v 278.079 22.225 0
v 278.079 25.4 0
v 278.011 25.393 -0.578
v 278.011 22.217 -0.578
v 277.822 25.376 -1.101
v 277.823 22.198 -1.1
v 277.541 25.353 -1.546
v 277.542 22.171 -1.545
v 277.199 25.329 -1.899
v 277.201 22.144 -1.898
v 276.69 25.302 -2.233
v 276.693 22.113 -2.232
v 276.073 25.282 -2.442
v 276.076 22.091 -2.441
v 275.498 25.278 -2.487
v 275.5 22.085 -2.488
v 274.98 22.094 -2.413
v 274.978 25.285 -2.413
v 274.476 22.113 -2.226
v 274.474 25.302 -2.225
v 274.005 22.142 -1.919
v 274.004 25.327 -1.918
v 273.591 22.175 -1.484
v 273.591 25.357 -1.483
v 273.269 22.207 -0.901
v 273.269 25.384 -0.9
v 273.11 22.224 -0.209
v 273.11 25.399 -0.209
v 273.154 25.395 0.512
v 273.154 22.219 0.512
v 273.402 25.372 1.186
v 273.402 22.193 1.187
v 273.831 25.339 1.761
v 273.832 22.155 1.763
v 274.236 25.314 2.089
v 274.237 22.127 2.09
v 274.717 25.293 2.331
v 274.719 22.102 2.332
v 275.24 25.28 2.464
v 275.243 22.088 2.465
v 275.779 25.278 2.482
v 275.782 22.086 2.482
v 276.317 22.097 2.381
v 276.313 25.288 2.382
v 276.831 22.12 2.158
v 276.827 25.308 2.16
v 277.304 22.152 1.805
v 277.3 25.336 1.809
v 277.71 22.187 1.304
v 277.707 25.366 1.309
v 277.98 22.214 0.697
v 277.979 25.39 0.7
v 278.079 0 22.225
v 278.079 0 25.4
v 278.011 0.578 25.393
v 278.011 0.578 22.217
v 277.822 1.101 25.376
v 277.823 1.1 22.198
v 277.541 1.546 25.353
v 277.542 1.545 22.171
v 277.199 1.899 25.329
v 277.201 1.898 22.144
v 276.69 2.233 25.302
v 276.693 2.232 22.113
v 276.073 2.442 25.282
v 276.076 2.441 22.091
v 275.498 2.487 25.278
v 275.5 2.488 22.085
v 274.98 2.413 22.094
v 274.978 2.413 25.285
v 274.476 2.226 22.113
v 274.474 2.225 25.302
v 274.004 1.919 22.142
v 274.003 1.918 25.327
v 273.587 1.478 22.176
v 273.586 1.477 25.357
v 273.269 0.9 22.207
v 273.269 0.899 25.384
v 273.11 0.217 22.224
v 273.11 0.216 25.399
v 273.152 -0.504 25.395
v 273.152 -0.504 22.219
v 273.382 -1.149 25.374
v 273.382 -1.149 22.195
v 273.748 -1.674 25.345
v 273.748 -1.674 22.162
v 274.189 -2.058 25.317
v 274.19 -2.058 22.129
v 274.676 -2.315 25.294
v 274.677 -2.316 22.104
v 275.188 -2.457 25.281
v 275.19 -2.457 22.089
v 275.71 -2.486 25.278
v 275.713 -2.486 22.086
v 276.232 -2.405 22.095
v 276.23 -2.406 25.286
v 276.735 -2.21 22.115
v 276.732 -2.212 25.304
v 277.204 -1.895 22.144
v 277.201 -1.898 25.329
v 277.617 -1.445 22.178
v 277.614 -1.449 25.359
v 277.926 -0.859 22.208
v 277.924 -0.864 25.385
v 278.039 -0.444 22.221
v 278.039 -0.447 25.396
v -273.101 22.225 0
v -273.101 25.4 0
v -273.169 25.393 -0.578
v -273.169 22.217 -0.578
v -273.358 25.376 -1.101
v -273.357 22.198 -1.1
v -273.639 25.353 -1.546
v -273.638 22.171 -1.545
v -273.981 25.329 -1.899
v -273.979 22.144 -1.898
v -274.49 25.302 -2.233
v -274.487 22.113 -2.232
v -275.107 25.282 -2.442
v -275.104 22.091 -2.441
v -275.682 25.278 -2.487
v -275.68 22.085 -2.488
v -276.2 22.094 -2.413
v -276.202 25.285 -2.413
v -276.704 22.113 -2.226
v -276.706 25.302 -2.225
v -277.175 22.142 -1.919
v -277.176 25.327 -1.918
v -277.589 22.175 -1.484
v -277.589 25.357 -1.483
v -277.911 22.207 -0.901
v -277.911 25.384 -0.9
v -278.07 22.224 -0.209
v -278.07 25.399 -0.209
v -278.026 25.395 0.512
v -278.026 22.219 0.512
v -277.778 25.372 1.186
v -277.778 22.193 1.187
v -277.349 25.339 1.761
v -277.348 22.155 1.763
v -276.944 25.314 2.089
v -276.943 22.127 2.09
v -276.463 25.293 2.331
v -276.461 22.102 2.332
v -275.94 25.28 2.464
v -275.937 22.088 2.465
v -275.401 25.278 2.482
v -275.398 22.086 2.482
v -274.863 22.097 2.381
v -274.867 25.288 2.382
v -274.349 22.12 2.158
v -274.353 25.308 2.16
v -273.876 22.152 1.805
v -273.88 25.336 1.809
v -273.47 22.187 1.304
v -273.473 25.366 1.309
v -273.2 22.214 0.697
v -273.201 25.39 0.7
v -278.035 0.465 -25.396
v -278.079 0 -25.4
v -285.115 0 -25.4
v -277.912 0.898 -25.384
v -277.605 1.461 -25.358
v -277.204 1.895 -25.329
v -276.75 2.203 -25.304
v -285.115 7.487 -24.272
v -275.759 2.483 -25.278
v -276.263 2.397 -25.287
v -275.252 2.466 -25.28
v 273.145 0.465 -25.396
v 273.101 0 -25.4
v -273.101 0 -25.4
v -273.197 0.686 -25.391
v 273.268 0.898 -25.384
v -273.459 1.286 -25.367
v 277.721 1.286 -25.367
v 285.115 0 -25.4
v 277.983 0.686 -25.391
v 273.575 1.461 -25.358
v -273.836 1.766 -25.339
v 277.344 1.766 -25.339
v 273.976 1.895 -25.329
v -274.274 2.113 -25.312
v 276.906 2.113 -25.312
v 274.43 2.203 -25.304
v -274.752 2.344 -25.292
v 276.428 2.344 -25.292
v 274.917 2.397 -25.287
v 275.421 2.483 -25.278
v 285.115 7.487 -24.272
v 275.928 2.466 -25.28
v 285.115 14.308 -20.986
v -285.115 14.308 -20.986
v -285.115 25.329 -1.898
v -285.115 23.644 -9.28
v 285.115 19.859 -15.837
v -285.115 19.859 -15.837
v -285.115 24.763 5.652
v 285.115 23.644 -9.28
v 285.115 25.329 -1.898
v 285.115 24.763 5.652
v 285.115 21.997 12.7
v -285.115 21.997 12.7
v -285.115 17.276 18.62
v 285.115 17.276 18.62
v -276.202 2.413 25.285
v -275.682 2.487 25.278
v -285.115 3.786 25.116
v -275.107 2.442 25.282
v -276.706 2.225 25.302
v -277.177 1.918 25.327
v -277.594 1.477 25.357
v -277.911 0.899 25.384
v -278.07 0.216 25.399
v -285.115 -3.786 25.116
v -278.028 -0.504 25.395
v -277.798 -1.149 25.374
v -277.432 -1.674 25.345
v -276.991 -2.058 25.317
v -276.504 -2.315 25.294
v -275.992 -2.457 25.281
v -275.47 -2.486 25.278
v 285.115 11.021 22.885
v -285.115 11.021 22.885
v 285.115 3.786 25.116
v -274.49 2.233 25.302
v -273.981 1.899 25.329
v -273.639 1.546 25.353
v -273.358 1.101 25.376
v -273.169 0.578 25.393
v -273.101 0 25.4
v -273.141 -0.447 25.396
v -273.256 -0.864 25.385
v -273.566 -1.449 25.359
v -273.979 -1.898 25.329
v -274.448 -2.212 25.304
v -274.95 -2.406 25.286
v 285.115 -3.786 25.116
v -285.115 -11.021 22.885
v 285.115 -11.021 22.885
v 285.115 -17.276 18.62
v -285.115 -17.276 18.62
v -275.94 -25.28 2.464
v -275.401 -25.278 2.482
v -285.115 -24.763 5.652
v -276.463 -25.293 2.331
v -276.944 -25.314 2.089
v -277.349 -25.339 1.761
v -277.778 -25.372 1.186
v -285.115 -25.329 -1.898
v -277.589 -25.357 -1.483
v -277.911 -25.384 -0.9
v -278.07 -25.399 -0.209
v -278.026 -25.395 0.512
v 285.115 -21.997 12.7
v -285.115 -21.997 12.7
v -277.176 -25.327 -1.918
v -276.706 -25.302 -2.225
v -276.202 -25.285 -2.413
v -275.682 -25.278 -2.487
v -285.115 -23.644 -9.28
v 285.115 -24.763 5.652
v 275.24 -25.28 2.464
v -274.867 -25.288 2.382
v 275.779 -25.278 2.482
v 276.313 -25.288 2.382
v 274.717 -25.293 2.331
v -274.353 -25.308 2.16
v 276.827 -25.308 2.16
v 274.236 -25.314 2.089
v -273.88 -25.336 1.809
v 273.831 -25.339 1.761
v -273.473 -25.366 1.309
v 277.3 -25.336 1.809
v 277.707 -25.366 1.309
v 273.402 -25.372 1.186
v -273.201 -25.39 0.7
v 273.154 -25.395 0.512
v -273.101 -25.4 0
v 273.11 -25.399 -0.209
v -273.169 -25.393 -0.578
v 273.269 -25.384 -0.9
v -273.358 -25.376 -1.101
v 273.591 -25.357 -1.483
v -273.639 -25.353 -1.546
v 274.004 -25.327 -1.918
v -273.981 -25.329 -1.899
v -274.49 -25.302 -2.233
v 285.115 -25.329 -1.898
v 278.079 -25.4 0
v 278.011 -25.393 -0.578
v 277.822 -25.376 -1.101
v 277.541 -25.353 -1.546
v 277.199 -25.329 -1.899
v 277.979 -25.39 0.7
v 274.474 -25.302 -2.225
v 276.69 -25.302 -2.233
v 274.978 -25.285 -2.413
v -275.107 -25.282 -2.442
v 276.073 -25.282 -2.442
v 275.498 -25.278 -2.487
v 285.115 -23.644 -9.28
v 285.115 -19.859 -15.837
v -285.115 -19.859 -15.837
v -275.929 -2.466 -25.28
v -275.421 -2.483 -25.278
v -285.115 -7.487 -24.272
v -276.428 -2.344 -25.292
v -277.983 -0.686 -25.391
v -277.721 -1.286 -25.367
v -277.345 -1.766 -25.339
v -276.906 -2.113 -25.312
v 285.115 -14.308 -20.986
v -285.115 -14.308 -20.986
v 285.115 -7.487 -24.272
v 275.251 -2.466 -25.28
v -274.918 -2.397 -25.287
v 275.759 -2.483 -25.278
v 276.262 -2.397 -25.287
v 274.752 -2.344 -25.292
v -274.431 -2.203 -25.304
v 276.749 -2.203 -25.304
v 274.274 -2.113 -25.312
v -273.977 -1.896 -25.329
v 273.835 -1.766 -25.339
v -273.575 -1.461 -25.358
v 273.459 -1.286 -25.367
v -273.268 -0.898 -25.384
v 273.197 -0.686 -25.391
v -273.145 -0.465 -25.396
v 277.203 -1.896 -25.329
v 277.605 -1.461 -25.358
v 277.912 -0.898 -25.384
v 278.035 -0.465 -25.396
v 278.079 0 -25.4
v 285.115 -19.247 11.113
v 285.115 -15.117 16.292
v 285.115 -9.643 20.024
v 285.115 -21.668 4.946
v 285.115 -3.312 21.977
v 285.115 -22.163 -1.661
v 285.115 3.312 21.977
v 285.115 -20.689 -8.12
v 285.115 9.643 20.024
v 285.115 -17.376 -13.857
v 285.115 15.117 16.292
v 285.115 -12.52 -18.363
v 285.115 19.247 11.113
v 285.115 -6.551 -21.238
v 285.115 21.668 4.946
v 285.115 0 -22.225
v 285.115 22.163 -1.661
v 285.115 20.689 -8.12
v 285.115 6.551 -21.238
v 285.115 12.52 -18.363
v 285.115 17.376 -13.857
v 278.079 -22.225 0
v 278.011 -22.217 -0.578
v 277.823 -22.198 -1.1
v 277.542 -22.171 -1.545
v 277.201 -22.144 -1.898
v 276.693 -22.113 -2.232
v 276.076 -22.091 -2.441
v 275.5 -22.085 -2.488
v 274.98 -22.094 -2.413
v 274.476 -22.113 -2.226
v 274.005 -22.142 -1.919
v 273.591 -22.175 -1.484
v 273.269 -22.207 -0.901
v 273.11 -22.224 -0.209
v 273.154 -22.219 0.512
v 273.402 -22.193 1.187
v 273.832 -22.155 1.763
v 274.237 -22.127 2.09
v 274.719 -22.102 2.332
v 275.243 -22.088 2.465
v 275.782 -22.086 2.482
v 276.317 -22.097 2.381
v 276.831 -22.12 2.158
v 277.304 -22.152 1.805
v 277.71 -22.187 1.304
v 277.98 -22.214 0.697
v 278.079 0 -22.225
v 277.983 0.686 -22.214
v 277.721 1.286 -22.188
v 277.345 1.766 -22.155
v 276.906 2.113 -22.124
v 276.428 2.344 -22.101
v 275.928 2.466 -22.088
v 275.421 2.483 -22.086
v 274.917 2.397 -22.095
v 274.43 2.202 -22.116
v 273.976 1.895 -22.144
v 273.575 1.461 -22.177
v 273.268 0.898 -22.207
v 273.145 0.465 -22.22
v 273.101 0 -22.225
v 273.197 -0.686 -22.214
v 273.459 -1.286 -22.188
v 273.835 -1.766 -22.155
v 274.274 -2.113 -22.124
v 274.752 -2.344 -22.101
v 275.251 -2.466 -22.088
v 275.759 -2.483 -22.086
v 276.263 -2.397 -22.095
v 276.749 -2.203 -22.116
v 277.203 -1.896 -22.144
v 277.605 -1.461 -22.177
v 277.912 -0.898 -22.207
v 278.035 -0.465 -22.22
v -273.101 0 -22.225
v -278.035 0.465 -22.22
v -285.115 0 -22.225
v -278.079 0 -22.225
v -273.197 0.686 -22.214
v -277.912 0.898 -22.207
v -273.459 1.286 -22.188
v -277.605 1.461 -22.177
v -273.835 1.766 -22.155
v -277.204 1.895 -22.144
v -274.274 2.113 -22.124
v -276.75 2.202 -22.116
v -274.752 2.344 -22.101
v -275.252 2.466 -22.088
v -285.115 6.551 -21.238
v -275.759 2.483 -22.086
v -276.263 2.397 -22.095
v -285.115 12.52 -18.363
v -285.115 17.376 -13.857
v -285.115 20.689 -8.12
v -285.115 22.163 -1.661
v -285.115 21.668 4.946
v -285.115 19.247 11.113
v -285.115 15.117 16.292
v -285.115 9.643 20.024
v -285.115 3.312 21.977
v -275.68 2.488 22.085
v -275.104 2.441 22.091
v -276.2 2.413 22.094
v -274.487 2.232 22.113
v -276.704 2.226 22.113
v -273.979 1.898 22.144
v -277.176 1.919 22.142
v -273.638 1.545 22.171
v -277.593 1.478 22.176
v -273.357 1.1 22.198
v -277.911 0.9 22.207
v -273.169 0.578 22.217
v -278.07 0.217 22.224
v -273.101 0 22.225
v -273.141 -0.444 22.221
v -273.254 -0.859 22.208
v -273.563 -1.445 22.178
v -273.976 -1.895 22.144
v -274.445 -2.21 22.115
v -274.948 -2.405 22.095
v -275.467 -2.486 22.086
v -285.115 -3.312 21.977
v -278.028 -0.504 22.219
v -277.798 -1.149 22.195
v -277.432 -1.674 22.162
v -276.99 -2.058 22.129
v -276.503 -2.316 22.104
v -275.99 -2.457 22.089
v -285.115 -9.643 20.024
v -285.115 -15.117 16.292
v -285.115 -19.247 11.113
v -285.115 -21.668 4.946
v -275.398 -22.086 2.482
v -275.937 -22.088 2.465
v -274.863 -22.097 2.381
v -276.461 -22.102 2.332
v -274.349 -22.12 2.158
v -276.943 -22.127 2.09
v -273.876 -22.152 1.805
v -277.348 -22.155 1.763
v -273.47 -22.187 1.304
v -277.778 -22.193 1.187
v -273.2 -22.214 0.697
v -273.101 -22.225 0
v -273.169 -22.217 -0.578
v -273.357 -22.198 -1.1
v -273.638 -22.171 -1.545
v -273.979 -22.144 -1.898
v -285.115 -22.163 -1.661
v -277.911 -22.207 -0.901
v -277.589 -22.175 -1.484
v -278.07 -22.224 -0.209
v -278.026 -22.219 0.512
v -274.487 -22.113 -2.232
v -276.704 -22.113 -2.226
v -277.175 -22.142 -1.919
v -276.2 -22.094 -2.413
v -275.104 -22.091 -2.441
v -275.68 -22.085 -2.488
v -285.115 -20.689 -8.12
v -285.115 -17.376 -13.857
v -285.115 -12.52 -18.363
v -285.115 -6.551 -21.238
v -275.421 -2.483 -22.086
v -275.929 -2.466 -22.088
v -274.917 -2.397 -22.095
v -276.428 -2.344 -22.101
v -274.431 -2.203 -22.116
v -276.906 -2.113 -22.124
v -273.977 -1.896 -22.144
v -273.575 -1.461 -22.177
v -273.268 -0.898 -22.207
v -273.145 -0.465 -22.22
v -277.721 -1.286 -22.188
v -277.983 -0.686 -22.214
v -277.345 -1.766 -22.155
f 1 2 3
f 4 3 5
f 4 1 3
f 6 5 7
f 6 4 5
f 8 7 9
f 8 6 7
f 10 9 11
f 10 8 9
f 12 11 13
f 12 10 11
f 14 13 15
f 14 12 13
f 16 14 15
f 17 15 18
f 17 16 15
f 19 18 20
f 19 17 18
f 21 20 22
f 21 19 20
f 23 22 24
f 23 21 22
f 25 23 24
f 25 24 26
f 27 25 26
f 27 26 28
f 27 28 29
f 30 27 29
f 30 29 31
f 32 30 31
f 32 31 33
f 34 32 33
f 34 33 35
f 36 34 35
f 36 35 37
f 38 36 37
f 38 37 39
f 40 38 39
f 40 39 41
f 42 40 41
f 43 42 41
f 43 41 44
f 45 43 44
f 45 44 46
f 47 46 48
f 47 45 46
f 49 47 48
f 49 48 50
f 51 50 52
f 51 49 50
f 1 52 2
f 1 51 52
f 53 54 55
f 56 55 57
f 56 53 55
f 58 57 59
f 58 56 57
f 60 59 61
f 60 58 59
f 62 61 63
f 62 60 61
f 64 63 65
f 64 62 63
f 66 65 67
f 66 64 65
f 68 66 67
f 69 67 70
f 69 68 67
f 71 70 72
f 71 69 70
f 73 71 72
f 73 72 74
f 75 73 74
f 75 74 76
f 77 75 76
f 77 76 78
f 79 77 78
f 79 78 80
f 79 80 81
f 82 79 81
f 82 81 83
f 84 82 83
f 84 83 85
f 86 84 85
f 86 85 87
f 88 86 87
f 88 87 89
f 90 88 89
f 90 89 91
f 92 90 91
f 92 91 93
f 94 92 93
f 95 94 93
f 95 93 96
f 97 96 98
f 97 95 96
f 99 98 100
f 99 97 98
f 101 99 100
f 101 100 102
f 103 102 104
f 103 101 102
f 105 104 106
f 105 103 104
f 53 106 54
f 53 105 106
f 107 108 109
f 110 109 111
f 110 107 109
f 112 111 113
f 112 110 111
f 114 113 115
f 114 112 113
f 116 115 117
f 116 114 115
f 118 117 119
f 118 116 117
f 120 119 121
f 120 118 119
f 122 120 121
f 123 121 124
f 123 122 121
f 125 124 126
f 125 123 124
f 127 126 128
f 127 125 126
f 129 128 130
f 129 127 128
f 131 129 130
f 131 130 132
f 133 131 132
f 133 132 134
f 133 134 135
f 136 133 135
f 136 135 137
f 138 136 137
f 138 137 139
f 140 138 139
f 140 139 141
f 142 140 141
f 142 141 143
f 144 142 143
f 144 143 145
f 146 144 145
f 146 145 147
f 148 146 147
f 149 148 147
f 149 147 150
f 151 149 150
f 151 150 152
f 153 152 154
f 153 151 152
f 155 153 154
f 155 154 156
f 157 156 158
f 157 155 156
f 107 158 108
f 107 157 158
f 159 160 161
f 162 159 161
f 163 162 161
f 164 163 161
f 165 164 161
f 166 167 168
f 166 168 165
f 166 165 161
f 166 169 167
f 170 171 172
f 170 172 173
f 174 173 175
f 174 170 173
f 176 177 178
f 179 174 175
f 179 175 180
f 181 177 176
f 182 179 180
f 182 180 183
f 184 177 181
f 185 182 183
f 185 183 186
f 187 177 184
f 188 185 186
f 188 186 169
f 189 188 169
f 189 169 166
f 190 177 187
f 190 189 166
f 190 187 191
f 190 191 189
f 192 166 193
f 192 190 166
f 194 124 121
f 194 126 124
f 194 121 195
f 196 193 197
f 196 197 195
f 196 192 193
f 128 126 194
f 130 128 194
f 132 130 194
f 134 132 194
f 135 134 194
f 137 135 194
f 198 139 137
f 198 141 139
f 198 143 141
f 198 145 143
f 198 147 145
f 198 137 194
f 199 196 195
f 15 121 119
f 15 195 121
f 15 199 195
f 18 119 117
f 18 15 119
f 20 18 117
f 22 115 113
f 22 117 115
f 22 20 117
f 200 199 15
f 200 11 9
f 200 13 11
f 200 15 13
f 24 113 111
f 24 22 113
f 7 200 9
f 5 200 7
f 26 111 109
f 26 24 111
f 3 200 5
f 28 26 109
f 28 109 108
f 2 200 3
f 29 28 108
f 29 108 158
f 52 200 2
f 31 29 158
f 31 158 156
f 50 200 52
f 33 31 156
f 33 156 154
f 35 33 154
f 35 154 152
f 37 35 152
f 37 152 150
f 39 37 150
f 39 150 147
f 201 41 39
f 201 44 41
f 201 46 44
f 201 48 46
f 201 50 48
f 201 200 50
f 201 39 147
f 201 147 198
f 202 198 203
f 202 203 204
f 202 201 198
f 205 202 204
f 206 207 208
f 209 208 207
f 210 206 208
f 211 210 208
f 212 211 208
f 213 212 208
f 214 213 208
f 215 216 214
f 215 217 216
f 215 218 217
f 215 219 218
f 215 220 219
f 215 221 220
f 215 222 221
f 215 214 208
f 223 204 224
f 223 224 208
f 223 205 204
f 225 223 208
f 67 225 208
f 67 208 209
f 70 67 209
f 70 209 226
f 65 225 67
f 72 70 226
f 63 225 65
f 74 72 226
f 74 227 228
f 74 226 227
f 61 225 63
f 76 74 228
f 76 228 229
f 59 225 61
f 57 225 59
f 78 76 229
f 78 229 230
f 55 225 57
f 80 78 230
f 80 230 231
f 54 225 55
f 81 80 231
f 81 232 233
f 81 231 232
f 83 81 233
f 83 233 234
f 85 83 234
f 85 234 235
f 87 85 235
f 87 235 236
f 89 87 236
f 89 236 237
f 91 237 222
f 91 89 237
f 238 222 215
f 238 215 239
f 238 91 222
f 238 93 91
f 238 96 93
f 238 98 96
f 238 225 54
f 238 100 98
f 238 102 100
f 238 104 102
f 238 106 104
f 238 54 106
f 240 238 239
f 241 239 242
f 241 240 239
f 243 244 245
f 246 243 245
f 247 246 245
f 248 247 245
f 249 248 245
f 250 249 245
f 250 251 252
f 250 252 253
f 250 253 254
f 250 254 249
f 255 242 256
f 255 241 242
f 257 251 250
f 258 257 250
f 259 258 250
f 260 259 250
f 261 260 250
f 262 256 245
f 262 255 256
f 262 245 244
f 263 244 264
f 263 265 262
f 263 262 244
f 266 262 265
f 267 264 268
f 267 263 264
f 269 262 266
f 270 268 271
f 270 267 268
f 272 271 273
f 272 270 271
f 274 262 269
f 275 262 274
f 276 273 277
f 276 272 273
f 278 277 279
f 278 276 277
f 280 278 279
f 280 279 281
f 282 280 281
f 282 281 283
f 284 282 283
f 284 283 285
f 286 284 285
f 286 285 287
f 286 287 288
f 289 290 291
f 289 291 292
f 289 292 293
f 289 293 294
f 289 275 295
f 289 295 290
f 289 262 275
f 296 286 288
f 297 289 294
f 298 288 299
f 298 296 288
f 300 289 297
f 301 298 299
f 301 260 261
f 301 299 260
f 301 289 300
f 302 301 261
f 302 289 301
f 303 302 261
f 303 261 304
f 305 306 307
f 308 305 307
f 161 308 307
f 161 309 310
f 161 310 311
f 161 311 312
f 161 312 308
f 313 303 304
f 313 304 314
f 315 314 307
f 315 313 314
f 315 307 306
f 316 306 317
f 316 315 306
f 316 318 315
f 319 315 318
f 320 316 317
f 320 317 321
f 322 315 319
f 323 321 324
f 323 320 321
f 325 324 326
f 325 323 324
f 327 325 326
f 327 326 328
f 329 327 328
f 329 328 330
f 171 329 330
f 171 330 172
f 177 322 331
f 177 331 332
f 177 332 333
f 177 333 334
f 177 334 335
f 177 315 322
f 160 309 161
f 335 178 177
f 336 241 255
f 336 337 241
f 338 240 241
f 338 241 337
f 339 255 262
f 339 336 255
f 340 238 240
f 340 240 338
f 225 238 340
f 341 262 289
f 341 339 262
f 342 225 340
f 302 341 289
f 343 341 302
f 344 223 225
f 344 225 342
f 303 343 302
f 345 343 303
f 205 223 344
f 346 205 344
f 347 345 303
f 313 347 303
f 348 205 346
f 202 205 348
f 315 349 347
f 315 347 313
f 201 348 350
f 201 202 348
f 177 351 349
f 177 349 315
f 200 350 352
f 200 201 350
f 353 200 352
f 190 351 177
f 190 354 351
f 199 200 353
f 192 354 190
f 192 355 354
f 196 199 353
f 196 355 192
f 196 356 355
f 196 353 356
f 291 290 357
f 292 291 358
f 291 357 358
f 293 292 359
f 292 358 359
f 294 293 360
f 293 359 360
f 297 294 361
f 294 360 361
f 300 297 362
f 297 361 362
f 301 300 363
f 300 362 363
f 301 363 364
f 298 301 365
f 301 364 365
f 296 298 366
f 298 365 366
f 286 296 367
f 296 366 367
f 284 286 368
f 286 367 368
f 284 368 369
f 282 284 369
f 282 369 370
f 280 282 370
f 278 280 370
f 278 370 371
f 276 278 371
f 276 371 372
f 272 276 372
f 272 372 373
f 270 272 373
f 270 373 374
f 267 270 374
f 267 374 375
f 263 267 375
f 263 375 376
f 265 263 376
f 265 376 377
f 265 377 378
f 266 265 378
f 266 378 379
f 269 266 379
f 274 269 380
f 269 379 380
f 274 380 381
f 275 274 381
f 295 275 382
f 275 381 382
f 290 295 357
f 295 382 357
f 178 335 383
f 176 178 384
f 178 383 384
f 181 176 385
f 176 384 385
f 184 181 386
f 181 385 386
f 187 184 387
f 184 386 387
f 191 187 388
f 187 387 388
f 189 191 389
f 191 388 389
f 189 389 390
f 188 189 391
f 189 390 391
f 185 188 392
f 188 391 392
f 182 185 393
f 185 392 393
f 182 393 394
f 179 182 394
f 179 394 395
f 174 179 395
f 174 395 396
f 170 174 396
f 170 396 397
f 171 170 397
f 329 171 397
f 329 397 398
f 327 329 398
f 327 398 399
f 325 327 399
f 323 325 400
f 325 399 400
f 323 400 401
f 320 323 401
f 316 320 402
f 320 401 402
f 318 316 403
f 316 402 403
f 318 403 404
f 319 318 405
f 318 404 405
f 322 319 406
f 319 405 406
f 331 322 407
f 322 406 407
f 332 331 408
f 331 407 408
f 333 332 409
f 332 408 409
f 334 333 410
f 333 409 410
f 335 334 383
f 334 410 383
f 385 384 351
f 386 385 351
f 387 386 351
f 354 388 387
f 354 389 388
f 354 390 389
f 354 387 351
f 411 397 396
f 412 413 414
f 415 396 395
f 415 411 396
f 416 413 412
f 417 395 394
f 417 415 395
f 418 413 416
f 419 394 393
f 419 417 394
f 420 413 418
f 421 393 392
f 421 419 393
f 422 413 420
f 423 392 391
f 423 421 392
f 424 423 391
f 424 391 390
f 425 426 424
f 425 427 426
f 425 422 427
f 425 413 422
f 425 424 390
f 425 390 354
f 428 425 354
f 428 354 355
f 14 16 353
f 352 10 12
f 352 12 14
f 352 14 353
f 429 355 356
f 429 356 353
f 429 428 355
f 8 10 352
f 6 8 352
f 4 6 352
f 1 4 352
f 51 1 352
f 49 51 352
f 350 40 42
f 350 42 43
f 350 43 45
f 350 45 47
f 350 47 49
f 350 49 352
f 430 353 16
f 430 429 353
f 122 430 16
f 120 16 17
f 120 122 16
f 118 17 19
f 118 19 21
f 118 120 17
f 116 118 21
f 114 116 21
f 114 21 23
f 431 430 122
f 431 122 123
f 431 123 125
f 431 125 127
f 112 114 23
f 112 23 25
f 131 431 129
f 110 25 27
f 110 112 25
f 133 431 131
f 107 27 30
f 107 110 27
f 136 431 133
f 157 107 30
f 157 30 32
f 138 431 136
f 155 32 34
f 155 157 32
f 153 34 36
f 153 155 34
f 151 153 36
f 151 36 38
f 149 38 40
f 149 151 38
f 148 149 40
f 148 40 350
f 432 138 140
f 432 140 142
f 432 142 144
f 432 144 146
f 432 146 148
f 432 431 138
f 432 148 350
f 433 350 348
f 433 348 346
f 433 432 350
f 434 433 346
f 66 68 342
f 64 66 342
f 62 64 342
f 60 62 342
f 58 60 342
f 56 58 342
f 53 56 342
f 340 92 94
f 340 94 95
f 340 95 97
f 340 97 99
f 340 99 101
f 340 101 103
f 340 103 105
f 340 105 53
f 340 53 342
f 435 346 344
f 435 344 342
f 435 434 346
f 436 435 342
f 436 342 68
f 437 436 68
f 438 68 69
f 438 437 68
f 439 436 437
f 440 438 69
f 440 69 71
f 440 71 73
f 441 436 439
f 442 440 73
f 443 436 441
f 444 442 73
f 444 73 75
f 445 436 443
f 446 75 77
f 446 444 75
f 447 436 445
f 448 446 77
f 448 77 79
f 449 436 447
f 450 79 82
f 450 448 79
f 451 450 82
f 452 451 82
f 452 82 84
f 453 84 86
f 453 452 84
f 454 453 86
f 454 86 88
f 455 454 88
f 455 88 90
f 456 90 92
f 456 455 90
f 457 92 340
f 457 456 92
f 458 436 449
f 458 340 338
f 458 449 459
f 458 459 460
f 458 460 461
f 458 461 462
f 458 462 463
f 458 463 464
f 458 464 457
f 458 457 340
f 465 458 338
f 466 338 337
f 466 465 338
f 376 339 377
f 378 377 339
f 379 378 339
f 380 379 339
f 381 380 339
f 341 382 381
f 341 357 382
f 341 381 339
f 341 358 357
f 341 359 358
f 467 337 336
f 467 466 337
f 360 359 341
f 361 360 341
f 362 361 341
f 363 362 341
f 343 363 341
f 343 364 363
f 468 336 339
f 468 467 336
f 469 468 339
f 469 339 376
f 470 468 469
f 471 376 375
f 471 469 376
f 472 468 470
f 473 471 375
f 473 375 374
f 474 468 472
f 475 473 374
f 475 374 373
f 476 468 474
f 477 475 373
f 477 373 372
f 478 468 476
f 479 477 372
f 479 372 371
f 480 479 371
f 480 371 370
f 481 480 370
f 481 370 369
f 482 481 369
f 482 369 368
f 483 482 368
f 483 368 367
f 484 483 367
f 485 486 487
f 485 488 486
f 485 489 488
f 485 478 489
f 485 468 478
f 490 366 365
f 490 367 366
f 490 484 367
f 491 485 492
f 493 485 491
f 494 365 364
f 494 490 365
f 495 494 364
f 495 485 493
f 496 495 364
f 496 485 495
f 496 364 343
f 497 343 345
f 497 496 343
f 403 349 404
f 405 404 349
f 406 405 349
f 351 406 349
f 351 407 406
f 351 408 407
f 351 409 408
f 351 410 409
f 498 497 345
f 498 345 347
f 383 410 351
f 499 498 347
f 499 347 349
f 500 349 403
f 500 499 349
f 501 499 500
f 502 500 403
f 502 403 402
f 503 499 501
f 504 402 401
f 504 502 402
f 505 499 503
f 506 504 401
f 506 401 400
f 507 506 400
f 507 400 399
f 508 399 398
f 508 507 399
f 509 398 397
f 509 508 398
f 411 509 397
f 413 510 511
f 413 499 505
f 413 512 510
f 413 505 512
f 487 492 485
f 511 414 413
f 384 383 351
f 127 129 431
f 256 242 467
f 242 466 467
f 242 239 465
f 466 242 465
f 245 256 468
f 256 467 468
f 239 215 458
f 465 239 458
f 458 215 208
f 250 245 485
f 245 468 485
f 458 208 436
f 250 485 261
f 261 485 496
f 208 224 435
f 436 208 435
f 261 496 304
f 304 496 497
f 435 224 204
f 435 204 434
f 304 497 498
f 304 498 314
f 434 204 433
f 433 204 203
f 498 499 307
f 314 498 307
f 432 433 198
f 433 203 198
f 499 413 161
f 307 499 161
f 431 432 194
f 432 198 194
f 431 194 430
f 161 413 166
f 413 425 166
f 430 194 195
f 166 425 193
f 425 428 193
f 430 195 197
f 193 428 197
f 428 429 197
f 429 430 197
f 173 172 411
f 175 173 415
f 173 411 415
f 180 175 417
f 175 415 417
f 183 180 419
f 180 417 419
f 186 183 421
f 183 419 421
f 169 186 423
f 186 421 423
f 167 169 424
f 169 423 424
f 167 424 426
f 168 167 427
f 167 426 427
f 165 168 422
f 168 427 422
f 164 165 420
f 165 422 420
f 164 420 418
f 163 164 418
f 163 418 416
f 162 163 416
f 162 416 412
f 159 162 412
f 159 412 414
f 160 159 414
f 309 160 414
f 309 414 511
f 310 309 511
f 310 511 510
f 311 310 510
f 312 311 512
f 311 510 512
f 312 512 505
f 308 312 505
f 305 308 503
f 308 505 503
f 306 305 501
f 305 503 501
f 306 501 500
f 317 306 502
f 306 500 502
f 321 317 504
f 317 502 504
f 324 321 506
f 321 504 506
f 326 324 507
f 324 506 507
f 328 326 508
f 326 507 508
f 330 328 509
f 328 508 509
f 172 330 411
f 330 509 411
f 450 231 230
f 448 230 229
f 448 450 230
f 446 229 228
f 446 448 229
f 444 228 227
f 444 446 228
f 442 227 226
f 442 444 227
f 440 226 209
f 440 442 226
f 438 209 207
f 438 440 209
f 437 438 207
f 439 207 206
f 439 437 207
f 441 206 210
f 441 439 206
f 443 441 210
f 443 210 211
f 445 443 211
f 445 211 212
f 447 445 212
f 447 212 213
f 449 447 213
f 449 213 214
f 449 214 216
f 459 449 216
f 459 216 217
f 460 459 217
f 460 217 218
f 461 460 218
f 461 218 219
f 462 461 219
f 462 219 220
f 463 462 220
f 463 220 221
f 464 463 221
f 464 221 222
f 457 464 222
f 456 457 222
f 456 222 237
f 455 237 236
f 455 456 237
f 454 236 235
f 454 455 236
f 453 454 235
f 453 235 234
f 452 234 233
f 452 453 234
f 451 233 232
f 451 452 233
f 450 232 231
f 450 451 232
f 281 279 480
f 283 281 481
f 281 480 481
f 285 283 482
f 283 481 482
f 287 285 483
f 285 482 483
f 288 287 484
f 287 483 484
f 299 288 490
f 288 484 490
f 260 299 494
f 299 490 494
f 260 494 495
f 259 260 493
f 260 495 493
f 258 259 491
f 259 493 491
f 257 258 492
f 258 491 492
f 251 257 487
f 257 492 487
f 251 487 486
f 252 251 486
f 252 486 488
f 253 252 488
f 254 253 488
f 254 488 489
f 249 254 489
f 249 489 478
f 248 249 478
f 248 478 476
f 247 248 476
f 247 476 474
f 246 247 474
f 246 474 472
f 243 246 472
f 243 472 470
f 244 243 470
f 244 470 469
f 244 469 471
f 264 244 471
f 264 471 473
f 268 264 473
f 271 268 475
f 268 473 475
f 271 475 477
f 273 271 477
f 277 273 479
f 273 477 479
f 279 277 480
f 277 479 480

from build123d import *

# Parameters (mm, degrees)
SKETCH1_R               = 25.4
SKETCH1_R_2             = 22.225
BOSS_EXTRUDE1_DEPTH     = 285.115
SKETCH2_R               = 2.4892
CUT_EXTRUDE1_DEPTH      = 26.4
CUT_EXTRUDE1_DEPTH_BACK = 26.4
SKETCH3_R               = 2.4892
CUT_EXTRUDE2_DEPTH      = 26.4000001
CUT_EXTRUDE2_DEPTH_BACK = 26.4000001


with BuildPart() as part:
    # Sketch1 → Boss-Extrude1 (new body, symmetric)
    with BuildSketch(Plane(origin=(0, 0, 0), x_dir=(0, 0, -1), z_dir=(1, 0, 0))):
        Circle(SKETCH1_R)
        Circle(SKETCH1_R_2, mode=Mode.SUBTRACT)
    extrude(amount=BOSS_EXTRUDE1_DEPTH, both=True)

    # Sketch2 → Cut-Extrude1 (cut, two sides)
    with BuildSketch(Plane.XY) as cut_extrude1_sk:
        with Locations((-275.59, 0)):
            Circle(SKETCH2_R)
        with Locations((275.59, 0)):
            Circle(SKETCH2_R)
    extrude(amount=CUT_EXTRUDE1_DEPTH, mode=Mode.SUBTRACT)
    extrude(cut_extrude1_sk.sketch, amount=-CUT_EXTRUDE1_DEPTH_BACK, mode=Mode.SUBTRACT)

    # Sketch3 → Cut-Extrude2 (cut, two sides)
    with BuildSketch(Plane(origin=(0, 0, 0), x_dir=(1, 0, 0), z_dir=(0, 1, 0))) as cut_extrude2_sk:
        with Locations((-275.59, 0)):
            Circle(SKETCH3_R)
        with Locations((275.59, 0)):
            Circle(SKETCH3_R)
    extrude(amount=CUT_EXTRUDE2_DEPTH, mode=Mode.SUBTRACT)
    extrude(cut_extrude2_sk.sketch, amount=-CUT_EXTRUDE2_DEPTH_BACK, mode=Mode.SUBTRACT)


solid = part.part
